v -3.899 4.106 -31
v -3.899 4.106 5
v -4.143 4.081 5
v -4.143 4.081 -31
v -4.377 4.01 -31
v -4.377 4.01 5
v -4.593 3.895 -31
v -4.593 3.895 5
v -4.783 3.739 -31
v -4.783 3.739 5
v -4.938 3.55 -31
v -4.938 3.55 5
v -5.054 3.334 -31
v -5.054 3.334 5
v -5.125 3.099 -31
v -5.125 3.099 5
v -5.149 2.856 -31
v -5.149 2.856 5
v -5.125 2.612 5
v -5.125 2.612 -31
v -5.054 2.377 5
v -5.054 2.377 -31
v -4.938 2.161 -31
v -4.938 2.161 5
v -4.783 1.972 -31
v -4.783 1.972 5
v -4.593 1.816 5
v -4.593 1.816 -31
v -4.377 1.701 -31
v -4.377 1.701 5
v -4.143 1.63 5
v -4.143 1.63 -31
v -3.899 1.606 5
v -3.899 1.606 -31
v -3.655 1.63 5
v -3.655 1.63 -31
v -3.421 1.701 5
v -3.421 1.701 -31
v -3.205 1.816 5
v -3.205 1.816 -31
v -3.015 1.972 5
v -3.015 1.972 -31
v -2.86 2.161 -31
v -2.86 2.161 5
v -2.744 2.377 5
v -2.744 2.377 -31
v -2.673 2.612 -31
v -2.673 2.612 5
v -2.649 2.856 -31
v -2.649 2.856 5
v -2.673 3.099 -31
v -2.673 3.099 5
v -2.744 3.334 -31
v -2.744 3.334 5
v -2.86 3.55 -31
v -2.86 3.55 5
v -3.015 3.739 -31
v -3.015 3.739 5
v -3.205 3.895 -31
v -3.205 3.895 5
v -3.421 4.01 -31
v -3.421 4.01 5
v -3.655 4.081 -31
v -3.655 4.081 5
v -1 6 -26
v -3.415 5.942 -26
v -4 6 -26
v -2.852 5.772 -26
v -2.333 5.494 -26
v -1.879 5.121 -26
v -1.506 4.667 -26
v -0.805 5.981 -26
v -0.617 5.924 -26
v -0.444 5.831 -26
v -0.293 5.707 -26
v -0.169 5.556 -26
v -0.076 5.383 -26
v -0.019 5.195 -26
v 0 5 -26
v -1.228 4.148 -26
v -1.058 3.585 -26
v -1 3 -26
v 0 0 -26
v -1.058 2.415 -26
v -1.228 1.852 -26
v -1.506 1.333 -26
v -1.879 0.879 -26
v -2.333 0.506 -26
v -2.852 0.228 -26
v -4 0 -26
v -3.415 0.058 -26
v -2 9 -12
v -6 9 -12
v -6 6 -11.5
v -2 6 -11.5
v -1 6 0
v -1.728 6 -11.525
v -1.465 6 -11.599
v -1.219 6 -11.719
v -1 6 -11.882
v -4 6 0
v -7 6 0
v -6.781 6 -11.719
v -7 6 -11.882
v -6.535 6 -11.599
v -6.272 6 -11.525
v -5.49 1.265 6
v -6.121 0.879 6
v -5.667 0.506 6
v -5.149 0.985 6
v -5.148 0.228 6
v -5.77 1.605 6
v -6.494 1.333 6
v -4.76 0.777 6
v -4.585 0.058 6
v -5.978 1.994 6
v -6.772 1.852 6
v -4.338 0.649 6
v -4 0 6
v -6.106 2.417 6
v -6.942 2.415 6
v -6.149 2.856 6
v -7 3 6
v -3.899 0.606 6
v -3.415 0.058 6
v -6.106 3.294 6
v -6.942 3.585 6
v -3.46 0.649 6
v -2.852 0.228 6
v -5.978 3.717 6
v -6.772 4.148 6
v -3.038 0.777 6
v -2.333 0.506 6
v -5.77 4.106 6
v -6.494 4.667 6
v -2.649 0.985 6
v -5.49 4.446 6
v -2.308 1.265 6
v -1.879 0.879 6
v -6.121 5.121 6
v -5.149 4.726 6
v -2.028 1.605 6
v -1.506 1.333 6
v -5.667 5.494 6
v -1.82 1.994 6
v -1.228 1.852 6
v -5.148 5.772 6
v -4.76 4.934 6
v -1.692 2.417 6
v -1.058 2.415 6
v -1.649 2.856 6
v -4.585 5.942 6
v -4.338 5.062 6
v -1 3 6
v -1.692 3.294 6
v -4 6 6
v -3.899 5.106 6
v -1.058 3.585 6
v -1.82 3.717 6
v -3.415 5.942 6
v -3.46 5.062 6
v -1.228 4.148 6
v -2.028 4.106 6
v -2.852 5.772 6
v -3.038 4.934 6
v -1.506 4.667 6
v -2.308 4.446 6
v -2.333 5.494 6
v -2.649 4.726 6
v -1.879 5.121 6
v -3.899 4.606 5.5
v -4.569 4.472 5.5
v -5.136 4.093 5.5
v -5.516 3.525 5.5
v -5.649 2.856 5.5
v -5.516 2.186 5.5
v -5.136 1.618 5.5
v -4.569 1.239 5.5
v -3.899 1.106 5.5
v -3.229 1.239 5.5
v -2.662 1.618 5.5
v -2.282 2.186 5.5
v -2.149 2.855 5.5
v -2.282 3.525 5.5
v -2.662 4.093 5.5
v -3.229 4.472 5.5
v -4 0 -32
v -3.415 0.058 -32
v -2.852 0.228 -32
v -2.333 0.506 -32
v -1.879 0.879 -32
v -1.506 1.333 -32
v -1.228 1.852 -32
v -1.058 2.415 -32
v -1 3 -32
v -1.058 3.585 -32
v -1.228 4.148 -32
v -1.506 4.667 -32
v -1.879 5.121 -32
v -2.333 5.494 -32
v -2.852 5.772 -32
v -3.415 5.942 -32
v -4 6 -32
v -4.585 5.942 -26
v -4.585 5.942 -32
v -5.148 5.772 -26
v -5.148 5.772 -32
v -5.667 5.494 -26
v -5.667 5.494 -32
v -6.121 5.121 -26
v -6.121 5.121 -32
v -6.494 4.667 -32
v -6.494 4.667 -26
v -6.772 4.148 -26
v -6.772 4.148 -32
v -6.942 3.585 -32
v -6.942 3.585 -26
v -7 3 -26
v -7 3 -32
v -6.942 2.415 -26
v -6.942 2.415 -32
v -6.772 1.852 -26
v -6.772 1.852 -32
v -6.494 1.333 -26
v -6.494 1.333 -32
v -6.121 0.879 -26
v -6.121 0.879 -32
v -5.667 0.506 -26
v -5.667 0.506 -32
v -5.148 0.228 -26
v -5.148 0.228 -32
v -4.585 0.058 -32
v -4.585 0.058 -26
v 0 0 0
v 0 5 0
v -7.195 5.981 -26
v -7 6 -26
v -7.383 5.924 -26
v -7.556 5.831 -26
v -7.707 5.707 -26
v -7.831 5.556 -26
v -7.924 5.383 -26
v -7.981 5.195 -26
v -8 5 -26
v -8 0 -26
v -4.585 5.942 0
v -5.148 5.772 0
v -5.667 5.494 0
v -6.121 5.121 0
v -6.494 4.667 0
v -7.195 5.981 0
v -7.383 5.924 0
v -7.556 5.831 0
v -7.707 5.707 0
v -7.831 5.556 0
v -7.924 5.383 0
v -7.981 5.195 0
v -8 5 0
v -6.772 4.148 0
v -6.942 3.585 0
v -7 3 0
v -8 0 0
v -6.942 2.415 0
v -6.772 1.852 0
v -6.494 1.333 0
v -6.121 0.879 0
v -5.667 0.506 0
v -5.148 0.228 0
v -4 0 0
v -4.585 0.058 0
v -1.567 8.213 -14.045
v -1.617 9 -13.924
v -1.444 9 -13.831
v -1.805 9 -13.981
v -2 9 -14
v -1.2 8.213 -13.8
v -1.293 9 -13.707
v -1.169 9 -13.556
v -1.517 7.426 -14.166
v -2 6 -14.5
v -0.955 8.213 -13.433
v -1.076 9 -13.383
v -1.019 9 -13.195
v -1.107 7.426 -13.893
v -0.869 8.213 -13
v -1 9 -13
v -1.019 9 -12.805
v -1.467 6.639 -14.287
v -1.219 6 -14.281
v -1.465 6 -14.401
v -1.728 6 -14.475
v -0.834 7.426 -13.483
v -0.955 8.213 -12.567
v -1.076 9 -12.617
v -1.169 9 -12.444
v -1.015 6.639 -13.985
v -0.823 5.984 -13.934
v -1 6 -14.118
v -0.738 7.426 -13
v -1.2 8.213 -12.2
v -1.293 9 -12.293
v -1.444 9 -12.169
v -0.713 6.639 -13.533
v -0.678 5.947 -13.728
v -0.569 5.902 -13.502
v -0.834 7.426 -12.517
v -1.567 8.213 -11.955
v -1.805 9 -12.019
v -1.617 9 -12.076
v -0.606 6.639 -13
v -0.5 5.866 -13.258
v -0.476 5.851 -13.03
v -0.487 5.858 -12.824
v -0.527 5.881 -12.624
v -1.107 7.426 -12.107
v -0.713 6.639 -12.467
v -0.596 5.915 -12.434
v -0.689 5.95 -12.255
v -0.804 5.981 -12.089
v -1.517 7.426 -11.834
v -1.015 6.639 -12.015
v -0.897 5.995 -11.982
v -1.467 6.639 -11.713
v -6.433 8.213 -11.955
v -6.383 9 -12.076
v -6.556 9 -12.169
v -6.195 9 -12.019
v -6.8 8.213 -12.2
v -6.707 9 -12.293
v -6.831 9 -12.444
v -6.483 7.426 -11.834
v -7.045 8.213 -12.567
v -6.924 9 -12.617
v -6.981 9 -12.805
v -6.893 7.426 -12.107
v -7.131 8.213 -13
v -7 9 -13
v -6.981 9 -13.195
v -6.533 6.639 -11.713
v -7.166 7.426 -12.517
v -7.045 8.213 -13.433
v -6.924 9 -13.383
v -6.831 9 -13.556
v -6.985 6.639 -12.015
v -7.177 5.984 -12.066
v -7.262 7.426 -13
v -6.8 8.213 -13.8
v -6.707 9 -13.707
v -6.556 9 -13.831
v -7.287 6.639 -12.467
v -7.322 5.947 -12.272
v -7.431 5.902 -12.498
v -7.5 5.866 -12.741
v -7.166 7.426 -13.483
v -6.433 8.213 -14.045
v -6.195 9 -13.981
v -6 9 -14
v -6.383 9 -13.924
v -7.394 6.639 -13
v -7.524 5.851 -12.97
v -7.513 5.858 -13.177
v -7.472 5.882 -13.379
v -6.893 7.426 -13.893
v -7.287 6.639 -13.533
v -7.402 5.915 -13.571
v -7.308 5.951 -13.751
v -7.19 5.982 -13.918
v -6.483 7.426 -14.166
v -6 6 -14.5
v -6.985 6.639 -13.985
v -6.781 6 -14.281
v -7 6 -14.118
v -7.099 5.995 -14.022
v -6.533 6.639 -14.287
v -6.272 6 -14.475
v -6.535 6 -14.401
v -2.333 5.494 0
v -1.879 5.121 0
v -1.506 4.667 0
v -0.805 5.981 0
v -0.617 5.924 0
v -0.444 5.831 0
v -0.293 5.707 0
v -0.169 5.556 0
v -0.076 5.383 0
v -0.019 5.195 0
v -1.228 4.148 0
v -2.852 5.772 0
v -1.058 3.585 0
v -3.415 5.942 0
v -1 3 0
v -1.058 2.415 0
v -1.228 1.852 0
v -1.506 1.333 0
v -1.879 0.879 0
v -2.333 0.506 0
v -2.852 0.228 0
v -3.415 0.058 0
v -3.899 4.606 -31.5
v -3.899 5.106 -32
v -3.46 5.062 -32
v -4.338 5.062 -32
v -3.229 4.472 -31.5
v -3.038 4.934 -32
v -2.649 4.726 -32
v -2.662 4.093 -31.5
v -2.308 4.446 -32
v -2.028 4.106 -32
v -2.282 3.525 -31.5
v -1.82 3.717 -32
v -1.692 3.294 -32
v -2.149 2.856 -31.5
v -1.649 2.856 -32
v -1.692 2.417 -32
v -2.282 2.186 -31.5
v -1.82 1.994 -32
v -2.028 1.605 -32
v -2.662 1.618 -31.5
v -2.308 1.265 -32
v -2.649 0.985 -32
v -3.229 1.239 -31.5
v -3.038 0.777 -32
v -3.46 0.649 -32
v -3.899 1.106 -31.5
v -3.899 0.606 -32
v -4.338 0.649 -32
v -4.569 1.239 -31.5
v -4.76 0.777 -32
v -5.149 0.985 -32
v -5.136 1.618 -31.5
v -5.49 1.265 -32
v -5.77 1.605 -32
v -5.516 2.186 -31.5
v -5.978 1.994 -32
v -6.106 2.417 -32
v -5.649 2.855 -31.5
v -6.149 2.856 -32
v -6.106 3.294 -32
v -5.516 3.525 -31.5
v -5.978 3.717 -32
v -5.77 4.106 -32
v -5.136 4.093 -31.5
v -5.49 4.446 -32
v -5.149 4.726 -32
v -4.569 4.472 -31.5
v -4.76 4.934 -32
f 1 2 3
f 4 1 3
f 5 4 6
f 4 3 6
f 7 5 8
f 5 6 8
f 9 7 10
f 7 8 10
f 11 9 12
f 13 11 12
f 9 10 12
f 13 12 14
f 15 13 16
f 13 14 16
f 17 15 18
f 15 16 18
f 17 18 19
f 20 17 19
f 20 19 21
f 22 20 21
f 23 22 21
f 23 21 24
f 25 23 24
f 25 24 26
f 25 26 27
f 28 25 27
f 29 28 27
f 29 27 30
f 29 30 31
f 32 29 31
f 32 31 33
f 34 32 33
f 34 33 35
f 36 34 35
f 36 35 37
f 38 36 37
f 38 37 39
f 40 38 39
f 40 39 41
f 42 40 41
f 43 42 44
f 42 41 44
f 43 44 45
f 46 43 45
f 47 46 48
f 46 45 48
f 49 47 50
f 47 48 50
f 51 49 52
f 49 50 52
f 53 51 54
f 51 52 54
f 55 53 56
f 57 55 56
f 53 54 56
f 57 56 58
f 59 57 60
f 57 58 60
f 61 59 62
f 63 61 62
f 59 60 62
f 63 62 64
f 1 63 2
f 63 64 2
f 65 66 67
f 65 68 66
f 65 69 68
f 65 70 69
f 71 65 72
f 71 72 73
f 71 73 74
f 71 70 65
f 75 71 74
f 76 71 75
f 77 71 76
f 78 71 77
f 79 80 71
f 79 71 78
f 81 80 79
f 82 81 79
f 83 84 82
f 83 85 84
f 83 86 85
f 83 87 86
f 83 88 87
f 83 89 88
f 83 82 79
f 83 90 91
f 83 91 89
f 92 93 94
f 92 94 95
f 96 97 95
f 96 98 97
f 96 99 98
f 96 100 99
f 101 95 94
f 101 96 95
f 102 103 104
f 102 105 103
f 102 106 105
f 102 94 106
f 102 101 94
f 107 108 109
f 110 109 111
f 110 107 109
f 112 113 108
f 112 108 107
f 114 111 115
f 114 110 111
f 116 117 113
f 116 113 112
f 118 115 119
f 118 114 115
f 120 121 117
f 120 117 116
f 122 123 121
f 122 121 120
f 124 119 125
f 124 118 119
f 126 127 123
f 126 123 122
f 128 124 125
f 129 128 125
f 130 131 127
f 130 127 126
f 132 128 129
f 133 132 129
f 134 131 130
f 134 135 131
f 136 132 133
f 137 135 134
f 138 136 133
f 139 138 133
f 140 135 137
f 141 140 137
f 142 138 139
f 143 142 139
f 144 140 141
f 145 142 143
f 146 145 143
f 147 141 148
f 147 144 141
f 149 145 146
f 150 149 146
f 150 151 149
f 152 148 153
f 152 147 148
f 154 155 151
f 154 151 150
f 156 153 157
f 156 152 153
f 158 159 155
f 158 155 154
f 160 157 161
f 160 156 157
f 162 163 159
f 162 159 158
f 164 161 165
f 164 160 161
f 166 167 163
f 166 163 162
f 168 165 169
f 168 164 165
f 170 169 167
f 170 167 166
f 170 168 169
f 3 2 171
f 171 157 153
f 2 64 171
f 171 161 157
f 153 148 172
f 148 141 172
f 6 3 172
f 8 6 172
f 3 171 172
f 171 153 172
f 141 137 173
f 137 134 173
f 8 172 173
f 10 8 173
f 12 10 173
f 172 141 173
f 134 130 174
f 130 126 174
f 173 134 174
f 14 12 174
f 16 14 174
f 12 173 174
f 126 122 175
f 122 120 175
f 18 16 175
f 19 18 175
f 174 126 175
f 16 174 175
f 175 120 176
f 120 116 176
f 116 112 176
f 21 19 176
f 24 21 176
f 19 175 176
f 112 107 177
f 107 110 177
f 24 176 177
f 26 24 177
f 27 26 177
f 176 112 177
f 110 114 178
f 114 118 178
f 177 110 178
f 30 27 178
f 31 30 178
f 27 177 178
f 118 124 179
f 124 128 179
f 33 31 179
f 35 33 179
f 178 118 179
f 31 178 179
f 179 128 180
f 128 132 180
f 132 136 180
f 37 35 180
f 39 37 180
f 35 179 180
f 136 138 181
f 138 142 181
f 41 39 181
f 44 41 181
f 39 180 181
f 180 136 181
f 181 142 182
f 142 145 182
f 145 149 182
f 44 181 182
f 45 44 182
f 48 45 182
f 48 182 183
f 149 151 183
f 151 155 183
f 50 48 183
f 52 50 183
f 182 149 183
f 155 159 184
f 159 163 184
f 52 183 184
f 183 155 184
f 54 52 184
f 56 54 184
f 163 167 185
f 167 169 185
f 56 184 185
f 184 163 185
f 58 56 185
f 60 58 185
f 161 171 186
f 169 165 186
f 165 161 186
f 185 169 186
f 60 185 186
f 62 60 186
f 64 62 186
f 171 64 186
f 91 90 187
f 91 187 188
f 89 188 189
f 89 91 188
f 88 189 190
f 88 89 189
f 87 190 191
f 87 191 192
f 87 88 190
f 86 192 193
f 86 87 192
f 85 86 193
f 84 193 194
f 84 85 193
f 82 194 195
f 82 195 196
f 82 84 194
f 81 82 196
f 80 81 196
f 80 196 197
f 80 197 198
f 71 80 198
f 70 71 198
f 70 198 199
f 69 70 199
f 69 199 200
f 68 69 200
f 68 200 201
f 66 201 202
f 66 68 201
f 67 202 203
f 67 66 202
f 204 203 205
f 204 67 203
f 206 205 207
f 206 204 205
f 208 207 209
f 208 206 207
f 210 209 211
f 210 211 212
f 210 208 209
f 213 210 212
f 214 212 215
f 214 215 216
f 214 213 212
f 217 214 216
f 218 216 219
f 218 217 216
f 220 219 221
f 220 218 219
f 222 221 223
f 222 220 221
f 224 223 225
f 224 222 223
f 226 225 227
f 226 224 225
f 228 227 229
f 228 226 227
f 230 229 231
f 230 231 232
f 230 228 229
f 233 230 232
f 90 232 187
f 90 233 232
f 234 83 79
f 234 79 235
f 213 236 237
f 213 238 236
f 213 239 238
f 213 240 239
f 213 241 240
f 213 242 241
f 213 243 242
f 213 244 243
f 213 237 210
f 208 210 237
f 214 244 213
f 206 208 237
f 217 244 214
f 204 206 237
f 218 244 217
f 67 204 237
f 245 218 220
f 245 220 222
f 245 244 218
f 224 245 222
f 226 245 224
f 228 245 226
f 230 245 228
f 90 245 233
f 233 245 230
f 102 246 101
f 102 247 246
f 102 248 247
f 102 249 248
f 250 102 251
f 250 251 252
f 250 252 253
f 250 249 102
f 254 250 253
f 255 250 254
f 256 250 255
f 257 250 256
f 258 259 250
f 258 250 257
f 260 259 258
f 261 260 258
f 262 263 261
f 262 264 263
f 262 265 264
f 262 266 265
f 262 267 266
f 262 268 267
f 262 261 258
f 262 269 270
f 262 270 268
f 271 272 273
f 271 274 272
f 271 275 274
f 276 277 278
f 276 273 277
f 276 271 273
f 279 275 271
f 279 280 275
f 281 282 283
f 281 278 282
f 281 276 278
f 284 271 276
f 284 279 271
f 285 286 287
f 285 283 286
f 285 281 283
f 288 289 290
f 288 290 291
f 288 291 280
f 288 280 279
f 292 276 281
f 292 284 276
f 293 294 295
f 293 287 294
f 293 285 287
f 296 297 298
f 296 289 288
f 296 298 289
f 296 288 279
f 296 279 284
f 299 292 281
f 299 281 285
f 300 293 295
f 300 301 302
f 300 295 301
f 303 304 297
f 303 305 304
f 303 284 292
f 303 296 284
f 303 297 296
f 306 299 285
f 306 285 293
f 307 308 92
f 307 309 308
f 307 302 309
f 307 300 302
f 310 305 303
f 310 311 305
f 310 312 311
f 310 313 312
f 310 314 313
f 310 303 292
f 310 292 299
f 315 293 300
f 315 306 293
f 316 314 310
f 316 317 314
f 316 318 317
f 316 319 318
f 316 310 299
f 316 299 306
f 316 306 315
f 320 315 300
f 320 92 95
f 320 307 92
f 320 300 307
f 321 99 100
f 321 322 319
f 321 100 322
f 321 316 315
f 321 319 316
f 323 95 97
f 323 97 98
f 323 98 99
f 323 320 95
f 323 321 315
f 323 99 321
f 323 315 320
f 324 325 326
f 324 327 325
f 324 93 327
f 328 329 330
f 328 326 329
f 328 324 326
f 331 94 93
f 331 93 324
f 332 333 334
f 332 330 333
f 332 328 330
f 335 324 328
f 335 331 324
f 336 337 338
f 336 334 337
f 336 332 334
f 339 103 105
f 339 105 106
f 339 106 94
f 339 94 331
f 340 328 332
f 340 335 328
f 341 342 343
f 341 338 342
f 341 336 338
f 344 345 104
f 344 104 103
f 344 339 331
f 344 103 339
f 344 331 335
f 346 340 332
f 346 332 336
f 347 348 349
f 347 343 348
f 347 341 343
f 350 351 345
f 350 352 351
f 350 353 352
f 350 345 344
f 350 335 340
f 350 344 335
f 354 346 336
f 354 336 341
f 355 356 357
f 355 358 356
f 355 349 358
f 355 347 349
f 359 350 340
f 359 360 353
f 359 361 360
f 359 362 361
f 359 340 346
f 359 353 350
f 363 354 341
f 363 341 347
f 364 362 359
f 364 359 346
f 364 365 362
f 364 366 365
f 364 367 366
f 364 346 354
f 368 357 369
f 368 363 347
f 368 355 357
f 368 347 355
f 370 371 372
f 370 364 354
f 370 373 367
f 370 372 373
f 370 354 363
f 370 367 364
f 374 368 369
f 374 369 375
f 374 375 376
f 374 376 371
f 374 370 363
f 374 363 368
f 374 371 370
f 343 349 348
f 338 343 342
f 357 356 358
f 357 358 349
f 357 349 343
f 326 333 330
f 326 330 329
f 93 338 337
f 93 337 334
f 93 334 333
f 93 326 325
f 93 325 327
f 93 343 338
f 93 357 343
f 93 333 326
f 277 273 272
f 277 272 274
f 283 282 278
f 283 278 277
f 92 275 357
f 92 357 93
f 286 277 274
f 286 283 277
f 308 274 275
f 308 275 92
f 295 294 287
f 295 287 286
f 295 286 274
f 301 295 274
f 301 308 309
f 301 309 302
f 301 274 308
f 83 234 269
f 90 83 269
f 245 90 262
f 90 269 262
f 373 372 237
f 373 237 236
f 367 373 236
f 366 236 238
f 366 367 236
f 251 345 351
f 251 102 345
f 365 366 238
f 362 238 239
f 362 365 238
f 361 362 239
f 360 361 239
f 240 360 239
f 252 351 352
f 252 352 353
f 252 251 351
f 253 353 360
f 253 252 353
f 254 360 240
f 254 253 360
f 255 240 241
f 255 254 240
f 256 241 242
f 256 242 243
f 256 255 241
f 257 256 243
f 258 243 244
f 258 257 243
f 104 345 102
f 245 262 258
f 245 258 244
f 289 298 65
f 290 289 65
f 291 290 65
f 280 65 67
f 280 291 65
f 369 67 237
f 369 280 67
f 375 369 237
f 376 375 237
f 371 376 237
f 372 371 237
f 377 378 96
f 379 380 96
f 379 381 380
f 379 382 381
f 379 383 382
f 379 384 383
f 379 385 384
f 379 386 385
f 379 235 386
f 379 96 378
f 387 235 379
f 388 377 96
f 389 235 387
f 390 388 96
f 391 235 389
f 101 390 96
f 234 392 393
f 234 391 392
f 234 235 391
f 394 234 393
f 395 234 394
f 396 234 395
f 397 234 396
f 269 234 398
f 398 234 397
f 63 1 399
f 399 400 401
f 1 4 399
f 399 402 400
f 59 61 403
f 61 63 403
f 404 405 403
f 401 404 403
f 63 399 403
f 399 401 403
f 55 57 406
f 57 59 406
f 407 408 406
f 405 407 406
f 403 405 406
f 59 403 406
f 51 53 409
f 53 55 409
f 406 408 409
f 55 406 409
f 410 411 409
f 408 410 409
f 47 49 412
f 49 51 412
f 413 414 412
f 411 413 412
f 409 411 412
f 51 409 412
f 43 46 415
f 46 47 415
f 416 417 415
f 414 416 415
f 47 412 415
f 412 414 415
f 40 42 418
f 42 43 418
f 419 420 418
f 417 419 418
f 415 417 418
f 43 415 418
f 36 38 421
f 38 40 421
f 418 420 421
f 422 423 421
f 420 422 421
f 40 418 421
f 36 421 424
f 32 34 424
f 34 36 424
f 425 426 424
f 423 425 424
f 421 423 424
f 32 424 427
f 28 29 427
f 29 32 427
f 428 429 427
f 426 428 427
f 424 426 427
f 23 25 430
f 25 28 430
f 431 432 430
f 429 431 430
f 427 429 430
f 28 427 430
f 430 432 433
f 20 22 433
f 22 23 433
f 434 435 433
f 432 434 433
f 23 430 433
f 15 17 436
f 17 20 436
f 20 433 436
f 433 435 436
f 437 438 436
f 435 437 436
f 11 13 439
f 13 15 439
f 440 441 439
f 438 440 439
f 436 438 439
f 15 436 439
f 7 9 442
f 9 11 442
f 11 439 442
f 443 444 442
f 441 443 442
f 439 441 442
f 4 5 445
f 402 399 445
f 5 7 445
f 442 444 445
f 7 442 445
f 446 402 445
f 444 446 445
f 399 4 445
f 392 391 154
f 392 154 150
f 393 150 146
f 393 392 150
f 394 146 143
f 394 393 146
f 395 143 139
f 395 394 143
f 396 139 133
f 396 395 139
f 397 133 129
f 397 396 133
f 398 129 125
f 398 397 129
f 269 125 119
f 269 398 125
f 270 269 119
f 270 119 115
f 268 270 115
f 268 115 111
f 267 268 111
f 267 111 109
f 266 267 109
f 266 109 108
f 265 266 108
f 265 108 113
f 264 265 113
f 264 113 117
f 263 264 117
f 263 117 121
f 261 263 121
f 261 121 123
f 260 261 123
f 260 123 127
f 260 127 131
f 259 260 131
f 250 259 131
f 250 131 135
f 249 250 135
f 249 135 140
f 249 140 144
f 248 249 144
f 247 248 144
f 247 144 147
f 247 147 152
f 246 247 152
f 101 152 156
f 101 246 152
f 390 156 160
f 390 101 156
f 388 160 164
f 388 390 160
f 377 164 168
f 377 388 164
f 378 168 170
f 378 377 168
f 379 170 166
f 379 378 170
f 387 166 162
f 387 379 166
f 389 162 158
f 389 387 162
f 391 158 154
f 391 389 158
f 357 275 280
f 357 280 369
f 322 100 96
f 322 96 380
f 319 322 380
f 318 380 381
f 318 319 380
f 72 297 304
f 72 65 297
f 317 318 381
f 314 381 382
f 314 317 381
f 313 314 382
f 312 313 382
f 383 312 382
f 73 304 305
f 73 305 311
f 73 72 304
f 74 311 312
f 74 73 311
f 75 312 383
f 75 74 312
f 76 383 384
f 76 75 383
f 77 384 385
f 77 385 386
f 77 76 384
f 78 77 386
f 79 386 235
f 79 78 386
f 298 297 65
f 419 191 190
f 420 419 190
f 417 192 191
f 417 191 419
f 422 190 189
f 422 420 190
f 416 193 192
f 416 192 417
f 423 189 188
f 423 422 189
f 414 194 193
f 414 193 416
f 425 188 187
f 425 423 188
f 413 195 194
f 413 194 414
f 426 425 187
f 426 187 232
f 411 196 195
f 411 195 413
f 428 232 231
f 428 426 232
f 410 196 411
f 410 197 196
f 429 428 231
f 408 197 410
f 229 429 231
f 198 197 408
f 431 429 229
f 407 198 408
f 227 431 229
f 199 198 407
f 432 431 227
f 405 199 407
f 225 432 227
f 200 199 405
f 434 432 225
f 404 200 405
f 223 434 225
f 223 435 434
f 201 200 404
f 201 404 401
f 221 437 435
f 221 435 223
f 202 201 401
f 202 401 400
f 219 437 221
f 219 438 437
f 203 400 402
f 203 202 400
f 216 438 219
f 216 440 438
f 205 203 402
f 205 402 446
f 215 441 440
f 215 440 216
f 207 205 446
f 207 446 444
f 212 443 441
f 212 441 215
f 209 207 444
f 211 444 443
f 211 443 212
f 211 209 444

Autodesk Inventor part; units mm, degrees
ref_plane "YZ Plane" through (0, 0, 0) normal (1, 0, 0) x (0, 1, 0)
ref_plane "XZ Plane" through (0, 0, 0) normal (0, 1, 0) x (-1, 0, 0)
sketch "Sketch1" plane through (0, 0, 0) normal (0, 1, 0) x (-1, 0, 0)
  line L0 (0, 0) -> (8, 0)
  line L1 (8, 0) -> (8, -26)
  line L2 (8, -26) -> (0, -26)
  line L3 (0, -26) -> (0, 0)
  dimension "d0" = 8
  dimension "d1" = 26
extrude "Extrusion1" add sketch "Sketch1" along normal blind 6
sketch "Sketch2" plane through (-8, 0, 0) normal (0, 0, 1) x (1, 0, 0)
  circle A0 centre (4, 3) radius 3
  line L0 (8, 0) -> (0, 0) projected
  line L1 (0, 0) -> (0, 6) projected
  dimension "d4" = 6
  dimension "d5" = 3
  dimension "d6" = 4
extrude "Extrusion2" add sketch "Sketch2" along normal blind 6
sketch "Sketch3" plane through (0, 0, -26) normal (0, 0, -1) x (-1, 0, 0)
  arc A0 (4, 0) -> (4, 6) centre (4, 3) ccw projected
  arc A1 (4, 6) -> (4, 0) centre (4, 3) ccw projected
  circle A2 centre (4, 3) radius 3
  point P0 (0, 0)
extrude "Extrusion3" add sketch "Sketch3" along normal blind 6
ref_plane "Work Plane1" through (0, 9, 0) normal (0, 1, 0) x (1, 0, 0)
sketch "Sketch7" plane through (0, 6, 0) normal (0, 1, 0) x (1, 0, 0)
  line L0 (-2, 13) -> (-6, 13) construction
  line L1 (-4.5266, -6) -> (-4.5266, 32) projected
  line L2 (-2, 14.5) -> (-6, 14.5)
  line L3 (-6, 11.5) -> (-2, 11.5)
  arc A0 (-2, 11.5) -> (-2, 14.5) centre (-2, 13) ccw
  arc A1 (-6, 14.5) -> (-6, 11.5) centre (-6, 13) ccw
  line L4 (-8, 26) -> (-8, 0) projected
  line L5 (-4, 0) -> (0, 0) projected
  point P0 (-4, 13)
  dimension "d26" = 3
  dimension "d27" = 4
  dimension "d28" = 4
  dimension "d29" = 13
sketch "Sketch8" plane through (0, 9, 0) normal (0, 1, 0) x (1, 0, 0)
  line L0 (-2, 13) -> (-6, 13) construction
  line L1 (-2, 14) -> (-6, 14)
  line L2 (-6, 12) -> (-2, 12)
  arc A0 (-2, 12) -> (-2, 14) centre (-2, 13) ccw
  arc A1 (-6, 14) -> (-6, 12) centre (-6, 13) ccw
  line L3 (-4, 13) -> (0, 13) construction
  line L4 (-8, 26) -> (-8, 0) projected
  line L5 (-4, 0) -> (0, 0) projected
  dimension "d30" = 2
  dimension "d31" = 180
  dimension "d32" = 2
  dimension "d33" = 4
  dimension "d34" = 13
loft "Loft1" add profiles "Sketch7", "Sketch8"
hole "Hole2" at (-3.899, 2.8555, -32) direction (0, 0, 1) diameter 2.5 end through all
chamfer "Chamfer1" distance 1 angle 45 1 edges at (-3.899, 1.6055, 6)
chamfer "Chamfer2" distance 1 angle 45 1 edges at (-3.899, 1.6055, -32)
fillet "Fillet1" radius 1 2 edges at (-8, 6, -13) (0, 6, -13)
properties part number "tracks_center" material "ABS Plastic"
